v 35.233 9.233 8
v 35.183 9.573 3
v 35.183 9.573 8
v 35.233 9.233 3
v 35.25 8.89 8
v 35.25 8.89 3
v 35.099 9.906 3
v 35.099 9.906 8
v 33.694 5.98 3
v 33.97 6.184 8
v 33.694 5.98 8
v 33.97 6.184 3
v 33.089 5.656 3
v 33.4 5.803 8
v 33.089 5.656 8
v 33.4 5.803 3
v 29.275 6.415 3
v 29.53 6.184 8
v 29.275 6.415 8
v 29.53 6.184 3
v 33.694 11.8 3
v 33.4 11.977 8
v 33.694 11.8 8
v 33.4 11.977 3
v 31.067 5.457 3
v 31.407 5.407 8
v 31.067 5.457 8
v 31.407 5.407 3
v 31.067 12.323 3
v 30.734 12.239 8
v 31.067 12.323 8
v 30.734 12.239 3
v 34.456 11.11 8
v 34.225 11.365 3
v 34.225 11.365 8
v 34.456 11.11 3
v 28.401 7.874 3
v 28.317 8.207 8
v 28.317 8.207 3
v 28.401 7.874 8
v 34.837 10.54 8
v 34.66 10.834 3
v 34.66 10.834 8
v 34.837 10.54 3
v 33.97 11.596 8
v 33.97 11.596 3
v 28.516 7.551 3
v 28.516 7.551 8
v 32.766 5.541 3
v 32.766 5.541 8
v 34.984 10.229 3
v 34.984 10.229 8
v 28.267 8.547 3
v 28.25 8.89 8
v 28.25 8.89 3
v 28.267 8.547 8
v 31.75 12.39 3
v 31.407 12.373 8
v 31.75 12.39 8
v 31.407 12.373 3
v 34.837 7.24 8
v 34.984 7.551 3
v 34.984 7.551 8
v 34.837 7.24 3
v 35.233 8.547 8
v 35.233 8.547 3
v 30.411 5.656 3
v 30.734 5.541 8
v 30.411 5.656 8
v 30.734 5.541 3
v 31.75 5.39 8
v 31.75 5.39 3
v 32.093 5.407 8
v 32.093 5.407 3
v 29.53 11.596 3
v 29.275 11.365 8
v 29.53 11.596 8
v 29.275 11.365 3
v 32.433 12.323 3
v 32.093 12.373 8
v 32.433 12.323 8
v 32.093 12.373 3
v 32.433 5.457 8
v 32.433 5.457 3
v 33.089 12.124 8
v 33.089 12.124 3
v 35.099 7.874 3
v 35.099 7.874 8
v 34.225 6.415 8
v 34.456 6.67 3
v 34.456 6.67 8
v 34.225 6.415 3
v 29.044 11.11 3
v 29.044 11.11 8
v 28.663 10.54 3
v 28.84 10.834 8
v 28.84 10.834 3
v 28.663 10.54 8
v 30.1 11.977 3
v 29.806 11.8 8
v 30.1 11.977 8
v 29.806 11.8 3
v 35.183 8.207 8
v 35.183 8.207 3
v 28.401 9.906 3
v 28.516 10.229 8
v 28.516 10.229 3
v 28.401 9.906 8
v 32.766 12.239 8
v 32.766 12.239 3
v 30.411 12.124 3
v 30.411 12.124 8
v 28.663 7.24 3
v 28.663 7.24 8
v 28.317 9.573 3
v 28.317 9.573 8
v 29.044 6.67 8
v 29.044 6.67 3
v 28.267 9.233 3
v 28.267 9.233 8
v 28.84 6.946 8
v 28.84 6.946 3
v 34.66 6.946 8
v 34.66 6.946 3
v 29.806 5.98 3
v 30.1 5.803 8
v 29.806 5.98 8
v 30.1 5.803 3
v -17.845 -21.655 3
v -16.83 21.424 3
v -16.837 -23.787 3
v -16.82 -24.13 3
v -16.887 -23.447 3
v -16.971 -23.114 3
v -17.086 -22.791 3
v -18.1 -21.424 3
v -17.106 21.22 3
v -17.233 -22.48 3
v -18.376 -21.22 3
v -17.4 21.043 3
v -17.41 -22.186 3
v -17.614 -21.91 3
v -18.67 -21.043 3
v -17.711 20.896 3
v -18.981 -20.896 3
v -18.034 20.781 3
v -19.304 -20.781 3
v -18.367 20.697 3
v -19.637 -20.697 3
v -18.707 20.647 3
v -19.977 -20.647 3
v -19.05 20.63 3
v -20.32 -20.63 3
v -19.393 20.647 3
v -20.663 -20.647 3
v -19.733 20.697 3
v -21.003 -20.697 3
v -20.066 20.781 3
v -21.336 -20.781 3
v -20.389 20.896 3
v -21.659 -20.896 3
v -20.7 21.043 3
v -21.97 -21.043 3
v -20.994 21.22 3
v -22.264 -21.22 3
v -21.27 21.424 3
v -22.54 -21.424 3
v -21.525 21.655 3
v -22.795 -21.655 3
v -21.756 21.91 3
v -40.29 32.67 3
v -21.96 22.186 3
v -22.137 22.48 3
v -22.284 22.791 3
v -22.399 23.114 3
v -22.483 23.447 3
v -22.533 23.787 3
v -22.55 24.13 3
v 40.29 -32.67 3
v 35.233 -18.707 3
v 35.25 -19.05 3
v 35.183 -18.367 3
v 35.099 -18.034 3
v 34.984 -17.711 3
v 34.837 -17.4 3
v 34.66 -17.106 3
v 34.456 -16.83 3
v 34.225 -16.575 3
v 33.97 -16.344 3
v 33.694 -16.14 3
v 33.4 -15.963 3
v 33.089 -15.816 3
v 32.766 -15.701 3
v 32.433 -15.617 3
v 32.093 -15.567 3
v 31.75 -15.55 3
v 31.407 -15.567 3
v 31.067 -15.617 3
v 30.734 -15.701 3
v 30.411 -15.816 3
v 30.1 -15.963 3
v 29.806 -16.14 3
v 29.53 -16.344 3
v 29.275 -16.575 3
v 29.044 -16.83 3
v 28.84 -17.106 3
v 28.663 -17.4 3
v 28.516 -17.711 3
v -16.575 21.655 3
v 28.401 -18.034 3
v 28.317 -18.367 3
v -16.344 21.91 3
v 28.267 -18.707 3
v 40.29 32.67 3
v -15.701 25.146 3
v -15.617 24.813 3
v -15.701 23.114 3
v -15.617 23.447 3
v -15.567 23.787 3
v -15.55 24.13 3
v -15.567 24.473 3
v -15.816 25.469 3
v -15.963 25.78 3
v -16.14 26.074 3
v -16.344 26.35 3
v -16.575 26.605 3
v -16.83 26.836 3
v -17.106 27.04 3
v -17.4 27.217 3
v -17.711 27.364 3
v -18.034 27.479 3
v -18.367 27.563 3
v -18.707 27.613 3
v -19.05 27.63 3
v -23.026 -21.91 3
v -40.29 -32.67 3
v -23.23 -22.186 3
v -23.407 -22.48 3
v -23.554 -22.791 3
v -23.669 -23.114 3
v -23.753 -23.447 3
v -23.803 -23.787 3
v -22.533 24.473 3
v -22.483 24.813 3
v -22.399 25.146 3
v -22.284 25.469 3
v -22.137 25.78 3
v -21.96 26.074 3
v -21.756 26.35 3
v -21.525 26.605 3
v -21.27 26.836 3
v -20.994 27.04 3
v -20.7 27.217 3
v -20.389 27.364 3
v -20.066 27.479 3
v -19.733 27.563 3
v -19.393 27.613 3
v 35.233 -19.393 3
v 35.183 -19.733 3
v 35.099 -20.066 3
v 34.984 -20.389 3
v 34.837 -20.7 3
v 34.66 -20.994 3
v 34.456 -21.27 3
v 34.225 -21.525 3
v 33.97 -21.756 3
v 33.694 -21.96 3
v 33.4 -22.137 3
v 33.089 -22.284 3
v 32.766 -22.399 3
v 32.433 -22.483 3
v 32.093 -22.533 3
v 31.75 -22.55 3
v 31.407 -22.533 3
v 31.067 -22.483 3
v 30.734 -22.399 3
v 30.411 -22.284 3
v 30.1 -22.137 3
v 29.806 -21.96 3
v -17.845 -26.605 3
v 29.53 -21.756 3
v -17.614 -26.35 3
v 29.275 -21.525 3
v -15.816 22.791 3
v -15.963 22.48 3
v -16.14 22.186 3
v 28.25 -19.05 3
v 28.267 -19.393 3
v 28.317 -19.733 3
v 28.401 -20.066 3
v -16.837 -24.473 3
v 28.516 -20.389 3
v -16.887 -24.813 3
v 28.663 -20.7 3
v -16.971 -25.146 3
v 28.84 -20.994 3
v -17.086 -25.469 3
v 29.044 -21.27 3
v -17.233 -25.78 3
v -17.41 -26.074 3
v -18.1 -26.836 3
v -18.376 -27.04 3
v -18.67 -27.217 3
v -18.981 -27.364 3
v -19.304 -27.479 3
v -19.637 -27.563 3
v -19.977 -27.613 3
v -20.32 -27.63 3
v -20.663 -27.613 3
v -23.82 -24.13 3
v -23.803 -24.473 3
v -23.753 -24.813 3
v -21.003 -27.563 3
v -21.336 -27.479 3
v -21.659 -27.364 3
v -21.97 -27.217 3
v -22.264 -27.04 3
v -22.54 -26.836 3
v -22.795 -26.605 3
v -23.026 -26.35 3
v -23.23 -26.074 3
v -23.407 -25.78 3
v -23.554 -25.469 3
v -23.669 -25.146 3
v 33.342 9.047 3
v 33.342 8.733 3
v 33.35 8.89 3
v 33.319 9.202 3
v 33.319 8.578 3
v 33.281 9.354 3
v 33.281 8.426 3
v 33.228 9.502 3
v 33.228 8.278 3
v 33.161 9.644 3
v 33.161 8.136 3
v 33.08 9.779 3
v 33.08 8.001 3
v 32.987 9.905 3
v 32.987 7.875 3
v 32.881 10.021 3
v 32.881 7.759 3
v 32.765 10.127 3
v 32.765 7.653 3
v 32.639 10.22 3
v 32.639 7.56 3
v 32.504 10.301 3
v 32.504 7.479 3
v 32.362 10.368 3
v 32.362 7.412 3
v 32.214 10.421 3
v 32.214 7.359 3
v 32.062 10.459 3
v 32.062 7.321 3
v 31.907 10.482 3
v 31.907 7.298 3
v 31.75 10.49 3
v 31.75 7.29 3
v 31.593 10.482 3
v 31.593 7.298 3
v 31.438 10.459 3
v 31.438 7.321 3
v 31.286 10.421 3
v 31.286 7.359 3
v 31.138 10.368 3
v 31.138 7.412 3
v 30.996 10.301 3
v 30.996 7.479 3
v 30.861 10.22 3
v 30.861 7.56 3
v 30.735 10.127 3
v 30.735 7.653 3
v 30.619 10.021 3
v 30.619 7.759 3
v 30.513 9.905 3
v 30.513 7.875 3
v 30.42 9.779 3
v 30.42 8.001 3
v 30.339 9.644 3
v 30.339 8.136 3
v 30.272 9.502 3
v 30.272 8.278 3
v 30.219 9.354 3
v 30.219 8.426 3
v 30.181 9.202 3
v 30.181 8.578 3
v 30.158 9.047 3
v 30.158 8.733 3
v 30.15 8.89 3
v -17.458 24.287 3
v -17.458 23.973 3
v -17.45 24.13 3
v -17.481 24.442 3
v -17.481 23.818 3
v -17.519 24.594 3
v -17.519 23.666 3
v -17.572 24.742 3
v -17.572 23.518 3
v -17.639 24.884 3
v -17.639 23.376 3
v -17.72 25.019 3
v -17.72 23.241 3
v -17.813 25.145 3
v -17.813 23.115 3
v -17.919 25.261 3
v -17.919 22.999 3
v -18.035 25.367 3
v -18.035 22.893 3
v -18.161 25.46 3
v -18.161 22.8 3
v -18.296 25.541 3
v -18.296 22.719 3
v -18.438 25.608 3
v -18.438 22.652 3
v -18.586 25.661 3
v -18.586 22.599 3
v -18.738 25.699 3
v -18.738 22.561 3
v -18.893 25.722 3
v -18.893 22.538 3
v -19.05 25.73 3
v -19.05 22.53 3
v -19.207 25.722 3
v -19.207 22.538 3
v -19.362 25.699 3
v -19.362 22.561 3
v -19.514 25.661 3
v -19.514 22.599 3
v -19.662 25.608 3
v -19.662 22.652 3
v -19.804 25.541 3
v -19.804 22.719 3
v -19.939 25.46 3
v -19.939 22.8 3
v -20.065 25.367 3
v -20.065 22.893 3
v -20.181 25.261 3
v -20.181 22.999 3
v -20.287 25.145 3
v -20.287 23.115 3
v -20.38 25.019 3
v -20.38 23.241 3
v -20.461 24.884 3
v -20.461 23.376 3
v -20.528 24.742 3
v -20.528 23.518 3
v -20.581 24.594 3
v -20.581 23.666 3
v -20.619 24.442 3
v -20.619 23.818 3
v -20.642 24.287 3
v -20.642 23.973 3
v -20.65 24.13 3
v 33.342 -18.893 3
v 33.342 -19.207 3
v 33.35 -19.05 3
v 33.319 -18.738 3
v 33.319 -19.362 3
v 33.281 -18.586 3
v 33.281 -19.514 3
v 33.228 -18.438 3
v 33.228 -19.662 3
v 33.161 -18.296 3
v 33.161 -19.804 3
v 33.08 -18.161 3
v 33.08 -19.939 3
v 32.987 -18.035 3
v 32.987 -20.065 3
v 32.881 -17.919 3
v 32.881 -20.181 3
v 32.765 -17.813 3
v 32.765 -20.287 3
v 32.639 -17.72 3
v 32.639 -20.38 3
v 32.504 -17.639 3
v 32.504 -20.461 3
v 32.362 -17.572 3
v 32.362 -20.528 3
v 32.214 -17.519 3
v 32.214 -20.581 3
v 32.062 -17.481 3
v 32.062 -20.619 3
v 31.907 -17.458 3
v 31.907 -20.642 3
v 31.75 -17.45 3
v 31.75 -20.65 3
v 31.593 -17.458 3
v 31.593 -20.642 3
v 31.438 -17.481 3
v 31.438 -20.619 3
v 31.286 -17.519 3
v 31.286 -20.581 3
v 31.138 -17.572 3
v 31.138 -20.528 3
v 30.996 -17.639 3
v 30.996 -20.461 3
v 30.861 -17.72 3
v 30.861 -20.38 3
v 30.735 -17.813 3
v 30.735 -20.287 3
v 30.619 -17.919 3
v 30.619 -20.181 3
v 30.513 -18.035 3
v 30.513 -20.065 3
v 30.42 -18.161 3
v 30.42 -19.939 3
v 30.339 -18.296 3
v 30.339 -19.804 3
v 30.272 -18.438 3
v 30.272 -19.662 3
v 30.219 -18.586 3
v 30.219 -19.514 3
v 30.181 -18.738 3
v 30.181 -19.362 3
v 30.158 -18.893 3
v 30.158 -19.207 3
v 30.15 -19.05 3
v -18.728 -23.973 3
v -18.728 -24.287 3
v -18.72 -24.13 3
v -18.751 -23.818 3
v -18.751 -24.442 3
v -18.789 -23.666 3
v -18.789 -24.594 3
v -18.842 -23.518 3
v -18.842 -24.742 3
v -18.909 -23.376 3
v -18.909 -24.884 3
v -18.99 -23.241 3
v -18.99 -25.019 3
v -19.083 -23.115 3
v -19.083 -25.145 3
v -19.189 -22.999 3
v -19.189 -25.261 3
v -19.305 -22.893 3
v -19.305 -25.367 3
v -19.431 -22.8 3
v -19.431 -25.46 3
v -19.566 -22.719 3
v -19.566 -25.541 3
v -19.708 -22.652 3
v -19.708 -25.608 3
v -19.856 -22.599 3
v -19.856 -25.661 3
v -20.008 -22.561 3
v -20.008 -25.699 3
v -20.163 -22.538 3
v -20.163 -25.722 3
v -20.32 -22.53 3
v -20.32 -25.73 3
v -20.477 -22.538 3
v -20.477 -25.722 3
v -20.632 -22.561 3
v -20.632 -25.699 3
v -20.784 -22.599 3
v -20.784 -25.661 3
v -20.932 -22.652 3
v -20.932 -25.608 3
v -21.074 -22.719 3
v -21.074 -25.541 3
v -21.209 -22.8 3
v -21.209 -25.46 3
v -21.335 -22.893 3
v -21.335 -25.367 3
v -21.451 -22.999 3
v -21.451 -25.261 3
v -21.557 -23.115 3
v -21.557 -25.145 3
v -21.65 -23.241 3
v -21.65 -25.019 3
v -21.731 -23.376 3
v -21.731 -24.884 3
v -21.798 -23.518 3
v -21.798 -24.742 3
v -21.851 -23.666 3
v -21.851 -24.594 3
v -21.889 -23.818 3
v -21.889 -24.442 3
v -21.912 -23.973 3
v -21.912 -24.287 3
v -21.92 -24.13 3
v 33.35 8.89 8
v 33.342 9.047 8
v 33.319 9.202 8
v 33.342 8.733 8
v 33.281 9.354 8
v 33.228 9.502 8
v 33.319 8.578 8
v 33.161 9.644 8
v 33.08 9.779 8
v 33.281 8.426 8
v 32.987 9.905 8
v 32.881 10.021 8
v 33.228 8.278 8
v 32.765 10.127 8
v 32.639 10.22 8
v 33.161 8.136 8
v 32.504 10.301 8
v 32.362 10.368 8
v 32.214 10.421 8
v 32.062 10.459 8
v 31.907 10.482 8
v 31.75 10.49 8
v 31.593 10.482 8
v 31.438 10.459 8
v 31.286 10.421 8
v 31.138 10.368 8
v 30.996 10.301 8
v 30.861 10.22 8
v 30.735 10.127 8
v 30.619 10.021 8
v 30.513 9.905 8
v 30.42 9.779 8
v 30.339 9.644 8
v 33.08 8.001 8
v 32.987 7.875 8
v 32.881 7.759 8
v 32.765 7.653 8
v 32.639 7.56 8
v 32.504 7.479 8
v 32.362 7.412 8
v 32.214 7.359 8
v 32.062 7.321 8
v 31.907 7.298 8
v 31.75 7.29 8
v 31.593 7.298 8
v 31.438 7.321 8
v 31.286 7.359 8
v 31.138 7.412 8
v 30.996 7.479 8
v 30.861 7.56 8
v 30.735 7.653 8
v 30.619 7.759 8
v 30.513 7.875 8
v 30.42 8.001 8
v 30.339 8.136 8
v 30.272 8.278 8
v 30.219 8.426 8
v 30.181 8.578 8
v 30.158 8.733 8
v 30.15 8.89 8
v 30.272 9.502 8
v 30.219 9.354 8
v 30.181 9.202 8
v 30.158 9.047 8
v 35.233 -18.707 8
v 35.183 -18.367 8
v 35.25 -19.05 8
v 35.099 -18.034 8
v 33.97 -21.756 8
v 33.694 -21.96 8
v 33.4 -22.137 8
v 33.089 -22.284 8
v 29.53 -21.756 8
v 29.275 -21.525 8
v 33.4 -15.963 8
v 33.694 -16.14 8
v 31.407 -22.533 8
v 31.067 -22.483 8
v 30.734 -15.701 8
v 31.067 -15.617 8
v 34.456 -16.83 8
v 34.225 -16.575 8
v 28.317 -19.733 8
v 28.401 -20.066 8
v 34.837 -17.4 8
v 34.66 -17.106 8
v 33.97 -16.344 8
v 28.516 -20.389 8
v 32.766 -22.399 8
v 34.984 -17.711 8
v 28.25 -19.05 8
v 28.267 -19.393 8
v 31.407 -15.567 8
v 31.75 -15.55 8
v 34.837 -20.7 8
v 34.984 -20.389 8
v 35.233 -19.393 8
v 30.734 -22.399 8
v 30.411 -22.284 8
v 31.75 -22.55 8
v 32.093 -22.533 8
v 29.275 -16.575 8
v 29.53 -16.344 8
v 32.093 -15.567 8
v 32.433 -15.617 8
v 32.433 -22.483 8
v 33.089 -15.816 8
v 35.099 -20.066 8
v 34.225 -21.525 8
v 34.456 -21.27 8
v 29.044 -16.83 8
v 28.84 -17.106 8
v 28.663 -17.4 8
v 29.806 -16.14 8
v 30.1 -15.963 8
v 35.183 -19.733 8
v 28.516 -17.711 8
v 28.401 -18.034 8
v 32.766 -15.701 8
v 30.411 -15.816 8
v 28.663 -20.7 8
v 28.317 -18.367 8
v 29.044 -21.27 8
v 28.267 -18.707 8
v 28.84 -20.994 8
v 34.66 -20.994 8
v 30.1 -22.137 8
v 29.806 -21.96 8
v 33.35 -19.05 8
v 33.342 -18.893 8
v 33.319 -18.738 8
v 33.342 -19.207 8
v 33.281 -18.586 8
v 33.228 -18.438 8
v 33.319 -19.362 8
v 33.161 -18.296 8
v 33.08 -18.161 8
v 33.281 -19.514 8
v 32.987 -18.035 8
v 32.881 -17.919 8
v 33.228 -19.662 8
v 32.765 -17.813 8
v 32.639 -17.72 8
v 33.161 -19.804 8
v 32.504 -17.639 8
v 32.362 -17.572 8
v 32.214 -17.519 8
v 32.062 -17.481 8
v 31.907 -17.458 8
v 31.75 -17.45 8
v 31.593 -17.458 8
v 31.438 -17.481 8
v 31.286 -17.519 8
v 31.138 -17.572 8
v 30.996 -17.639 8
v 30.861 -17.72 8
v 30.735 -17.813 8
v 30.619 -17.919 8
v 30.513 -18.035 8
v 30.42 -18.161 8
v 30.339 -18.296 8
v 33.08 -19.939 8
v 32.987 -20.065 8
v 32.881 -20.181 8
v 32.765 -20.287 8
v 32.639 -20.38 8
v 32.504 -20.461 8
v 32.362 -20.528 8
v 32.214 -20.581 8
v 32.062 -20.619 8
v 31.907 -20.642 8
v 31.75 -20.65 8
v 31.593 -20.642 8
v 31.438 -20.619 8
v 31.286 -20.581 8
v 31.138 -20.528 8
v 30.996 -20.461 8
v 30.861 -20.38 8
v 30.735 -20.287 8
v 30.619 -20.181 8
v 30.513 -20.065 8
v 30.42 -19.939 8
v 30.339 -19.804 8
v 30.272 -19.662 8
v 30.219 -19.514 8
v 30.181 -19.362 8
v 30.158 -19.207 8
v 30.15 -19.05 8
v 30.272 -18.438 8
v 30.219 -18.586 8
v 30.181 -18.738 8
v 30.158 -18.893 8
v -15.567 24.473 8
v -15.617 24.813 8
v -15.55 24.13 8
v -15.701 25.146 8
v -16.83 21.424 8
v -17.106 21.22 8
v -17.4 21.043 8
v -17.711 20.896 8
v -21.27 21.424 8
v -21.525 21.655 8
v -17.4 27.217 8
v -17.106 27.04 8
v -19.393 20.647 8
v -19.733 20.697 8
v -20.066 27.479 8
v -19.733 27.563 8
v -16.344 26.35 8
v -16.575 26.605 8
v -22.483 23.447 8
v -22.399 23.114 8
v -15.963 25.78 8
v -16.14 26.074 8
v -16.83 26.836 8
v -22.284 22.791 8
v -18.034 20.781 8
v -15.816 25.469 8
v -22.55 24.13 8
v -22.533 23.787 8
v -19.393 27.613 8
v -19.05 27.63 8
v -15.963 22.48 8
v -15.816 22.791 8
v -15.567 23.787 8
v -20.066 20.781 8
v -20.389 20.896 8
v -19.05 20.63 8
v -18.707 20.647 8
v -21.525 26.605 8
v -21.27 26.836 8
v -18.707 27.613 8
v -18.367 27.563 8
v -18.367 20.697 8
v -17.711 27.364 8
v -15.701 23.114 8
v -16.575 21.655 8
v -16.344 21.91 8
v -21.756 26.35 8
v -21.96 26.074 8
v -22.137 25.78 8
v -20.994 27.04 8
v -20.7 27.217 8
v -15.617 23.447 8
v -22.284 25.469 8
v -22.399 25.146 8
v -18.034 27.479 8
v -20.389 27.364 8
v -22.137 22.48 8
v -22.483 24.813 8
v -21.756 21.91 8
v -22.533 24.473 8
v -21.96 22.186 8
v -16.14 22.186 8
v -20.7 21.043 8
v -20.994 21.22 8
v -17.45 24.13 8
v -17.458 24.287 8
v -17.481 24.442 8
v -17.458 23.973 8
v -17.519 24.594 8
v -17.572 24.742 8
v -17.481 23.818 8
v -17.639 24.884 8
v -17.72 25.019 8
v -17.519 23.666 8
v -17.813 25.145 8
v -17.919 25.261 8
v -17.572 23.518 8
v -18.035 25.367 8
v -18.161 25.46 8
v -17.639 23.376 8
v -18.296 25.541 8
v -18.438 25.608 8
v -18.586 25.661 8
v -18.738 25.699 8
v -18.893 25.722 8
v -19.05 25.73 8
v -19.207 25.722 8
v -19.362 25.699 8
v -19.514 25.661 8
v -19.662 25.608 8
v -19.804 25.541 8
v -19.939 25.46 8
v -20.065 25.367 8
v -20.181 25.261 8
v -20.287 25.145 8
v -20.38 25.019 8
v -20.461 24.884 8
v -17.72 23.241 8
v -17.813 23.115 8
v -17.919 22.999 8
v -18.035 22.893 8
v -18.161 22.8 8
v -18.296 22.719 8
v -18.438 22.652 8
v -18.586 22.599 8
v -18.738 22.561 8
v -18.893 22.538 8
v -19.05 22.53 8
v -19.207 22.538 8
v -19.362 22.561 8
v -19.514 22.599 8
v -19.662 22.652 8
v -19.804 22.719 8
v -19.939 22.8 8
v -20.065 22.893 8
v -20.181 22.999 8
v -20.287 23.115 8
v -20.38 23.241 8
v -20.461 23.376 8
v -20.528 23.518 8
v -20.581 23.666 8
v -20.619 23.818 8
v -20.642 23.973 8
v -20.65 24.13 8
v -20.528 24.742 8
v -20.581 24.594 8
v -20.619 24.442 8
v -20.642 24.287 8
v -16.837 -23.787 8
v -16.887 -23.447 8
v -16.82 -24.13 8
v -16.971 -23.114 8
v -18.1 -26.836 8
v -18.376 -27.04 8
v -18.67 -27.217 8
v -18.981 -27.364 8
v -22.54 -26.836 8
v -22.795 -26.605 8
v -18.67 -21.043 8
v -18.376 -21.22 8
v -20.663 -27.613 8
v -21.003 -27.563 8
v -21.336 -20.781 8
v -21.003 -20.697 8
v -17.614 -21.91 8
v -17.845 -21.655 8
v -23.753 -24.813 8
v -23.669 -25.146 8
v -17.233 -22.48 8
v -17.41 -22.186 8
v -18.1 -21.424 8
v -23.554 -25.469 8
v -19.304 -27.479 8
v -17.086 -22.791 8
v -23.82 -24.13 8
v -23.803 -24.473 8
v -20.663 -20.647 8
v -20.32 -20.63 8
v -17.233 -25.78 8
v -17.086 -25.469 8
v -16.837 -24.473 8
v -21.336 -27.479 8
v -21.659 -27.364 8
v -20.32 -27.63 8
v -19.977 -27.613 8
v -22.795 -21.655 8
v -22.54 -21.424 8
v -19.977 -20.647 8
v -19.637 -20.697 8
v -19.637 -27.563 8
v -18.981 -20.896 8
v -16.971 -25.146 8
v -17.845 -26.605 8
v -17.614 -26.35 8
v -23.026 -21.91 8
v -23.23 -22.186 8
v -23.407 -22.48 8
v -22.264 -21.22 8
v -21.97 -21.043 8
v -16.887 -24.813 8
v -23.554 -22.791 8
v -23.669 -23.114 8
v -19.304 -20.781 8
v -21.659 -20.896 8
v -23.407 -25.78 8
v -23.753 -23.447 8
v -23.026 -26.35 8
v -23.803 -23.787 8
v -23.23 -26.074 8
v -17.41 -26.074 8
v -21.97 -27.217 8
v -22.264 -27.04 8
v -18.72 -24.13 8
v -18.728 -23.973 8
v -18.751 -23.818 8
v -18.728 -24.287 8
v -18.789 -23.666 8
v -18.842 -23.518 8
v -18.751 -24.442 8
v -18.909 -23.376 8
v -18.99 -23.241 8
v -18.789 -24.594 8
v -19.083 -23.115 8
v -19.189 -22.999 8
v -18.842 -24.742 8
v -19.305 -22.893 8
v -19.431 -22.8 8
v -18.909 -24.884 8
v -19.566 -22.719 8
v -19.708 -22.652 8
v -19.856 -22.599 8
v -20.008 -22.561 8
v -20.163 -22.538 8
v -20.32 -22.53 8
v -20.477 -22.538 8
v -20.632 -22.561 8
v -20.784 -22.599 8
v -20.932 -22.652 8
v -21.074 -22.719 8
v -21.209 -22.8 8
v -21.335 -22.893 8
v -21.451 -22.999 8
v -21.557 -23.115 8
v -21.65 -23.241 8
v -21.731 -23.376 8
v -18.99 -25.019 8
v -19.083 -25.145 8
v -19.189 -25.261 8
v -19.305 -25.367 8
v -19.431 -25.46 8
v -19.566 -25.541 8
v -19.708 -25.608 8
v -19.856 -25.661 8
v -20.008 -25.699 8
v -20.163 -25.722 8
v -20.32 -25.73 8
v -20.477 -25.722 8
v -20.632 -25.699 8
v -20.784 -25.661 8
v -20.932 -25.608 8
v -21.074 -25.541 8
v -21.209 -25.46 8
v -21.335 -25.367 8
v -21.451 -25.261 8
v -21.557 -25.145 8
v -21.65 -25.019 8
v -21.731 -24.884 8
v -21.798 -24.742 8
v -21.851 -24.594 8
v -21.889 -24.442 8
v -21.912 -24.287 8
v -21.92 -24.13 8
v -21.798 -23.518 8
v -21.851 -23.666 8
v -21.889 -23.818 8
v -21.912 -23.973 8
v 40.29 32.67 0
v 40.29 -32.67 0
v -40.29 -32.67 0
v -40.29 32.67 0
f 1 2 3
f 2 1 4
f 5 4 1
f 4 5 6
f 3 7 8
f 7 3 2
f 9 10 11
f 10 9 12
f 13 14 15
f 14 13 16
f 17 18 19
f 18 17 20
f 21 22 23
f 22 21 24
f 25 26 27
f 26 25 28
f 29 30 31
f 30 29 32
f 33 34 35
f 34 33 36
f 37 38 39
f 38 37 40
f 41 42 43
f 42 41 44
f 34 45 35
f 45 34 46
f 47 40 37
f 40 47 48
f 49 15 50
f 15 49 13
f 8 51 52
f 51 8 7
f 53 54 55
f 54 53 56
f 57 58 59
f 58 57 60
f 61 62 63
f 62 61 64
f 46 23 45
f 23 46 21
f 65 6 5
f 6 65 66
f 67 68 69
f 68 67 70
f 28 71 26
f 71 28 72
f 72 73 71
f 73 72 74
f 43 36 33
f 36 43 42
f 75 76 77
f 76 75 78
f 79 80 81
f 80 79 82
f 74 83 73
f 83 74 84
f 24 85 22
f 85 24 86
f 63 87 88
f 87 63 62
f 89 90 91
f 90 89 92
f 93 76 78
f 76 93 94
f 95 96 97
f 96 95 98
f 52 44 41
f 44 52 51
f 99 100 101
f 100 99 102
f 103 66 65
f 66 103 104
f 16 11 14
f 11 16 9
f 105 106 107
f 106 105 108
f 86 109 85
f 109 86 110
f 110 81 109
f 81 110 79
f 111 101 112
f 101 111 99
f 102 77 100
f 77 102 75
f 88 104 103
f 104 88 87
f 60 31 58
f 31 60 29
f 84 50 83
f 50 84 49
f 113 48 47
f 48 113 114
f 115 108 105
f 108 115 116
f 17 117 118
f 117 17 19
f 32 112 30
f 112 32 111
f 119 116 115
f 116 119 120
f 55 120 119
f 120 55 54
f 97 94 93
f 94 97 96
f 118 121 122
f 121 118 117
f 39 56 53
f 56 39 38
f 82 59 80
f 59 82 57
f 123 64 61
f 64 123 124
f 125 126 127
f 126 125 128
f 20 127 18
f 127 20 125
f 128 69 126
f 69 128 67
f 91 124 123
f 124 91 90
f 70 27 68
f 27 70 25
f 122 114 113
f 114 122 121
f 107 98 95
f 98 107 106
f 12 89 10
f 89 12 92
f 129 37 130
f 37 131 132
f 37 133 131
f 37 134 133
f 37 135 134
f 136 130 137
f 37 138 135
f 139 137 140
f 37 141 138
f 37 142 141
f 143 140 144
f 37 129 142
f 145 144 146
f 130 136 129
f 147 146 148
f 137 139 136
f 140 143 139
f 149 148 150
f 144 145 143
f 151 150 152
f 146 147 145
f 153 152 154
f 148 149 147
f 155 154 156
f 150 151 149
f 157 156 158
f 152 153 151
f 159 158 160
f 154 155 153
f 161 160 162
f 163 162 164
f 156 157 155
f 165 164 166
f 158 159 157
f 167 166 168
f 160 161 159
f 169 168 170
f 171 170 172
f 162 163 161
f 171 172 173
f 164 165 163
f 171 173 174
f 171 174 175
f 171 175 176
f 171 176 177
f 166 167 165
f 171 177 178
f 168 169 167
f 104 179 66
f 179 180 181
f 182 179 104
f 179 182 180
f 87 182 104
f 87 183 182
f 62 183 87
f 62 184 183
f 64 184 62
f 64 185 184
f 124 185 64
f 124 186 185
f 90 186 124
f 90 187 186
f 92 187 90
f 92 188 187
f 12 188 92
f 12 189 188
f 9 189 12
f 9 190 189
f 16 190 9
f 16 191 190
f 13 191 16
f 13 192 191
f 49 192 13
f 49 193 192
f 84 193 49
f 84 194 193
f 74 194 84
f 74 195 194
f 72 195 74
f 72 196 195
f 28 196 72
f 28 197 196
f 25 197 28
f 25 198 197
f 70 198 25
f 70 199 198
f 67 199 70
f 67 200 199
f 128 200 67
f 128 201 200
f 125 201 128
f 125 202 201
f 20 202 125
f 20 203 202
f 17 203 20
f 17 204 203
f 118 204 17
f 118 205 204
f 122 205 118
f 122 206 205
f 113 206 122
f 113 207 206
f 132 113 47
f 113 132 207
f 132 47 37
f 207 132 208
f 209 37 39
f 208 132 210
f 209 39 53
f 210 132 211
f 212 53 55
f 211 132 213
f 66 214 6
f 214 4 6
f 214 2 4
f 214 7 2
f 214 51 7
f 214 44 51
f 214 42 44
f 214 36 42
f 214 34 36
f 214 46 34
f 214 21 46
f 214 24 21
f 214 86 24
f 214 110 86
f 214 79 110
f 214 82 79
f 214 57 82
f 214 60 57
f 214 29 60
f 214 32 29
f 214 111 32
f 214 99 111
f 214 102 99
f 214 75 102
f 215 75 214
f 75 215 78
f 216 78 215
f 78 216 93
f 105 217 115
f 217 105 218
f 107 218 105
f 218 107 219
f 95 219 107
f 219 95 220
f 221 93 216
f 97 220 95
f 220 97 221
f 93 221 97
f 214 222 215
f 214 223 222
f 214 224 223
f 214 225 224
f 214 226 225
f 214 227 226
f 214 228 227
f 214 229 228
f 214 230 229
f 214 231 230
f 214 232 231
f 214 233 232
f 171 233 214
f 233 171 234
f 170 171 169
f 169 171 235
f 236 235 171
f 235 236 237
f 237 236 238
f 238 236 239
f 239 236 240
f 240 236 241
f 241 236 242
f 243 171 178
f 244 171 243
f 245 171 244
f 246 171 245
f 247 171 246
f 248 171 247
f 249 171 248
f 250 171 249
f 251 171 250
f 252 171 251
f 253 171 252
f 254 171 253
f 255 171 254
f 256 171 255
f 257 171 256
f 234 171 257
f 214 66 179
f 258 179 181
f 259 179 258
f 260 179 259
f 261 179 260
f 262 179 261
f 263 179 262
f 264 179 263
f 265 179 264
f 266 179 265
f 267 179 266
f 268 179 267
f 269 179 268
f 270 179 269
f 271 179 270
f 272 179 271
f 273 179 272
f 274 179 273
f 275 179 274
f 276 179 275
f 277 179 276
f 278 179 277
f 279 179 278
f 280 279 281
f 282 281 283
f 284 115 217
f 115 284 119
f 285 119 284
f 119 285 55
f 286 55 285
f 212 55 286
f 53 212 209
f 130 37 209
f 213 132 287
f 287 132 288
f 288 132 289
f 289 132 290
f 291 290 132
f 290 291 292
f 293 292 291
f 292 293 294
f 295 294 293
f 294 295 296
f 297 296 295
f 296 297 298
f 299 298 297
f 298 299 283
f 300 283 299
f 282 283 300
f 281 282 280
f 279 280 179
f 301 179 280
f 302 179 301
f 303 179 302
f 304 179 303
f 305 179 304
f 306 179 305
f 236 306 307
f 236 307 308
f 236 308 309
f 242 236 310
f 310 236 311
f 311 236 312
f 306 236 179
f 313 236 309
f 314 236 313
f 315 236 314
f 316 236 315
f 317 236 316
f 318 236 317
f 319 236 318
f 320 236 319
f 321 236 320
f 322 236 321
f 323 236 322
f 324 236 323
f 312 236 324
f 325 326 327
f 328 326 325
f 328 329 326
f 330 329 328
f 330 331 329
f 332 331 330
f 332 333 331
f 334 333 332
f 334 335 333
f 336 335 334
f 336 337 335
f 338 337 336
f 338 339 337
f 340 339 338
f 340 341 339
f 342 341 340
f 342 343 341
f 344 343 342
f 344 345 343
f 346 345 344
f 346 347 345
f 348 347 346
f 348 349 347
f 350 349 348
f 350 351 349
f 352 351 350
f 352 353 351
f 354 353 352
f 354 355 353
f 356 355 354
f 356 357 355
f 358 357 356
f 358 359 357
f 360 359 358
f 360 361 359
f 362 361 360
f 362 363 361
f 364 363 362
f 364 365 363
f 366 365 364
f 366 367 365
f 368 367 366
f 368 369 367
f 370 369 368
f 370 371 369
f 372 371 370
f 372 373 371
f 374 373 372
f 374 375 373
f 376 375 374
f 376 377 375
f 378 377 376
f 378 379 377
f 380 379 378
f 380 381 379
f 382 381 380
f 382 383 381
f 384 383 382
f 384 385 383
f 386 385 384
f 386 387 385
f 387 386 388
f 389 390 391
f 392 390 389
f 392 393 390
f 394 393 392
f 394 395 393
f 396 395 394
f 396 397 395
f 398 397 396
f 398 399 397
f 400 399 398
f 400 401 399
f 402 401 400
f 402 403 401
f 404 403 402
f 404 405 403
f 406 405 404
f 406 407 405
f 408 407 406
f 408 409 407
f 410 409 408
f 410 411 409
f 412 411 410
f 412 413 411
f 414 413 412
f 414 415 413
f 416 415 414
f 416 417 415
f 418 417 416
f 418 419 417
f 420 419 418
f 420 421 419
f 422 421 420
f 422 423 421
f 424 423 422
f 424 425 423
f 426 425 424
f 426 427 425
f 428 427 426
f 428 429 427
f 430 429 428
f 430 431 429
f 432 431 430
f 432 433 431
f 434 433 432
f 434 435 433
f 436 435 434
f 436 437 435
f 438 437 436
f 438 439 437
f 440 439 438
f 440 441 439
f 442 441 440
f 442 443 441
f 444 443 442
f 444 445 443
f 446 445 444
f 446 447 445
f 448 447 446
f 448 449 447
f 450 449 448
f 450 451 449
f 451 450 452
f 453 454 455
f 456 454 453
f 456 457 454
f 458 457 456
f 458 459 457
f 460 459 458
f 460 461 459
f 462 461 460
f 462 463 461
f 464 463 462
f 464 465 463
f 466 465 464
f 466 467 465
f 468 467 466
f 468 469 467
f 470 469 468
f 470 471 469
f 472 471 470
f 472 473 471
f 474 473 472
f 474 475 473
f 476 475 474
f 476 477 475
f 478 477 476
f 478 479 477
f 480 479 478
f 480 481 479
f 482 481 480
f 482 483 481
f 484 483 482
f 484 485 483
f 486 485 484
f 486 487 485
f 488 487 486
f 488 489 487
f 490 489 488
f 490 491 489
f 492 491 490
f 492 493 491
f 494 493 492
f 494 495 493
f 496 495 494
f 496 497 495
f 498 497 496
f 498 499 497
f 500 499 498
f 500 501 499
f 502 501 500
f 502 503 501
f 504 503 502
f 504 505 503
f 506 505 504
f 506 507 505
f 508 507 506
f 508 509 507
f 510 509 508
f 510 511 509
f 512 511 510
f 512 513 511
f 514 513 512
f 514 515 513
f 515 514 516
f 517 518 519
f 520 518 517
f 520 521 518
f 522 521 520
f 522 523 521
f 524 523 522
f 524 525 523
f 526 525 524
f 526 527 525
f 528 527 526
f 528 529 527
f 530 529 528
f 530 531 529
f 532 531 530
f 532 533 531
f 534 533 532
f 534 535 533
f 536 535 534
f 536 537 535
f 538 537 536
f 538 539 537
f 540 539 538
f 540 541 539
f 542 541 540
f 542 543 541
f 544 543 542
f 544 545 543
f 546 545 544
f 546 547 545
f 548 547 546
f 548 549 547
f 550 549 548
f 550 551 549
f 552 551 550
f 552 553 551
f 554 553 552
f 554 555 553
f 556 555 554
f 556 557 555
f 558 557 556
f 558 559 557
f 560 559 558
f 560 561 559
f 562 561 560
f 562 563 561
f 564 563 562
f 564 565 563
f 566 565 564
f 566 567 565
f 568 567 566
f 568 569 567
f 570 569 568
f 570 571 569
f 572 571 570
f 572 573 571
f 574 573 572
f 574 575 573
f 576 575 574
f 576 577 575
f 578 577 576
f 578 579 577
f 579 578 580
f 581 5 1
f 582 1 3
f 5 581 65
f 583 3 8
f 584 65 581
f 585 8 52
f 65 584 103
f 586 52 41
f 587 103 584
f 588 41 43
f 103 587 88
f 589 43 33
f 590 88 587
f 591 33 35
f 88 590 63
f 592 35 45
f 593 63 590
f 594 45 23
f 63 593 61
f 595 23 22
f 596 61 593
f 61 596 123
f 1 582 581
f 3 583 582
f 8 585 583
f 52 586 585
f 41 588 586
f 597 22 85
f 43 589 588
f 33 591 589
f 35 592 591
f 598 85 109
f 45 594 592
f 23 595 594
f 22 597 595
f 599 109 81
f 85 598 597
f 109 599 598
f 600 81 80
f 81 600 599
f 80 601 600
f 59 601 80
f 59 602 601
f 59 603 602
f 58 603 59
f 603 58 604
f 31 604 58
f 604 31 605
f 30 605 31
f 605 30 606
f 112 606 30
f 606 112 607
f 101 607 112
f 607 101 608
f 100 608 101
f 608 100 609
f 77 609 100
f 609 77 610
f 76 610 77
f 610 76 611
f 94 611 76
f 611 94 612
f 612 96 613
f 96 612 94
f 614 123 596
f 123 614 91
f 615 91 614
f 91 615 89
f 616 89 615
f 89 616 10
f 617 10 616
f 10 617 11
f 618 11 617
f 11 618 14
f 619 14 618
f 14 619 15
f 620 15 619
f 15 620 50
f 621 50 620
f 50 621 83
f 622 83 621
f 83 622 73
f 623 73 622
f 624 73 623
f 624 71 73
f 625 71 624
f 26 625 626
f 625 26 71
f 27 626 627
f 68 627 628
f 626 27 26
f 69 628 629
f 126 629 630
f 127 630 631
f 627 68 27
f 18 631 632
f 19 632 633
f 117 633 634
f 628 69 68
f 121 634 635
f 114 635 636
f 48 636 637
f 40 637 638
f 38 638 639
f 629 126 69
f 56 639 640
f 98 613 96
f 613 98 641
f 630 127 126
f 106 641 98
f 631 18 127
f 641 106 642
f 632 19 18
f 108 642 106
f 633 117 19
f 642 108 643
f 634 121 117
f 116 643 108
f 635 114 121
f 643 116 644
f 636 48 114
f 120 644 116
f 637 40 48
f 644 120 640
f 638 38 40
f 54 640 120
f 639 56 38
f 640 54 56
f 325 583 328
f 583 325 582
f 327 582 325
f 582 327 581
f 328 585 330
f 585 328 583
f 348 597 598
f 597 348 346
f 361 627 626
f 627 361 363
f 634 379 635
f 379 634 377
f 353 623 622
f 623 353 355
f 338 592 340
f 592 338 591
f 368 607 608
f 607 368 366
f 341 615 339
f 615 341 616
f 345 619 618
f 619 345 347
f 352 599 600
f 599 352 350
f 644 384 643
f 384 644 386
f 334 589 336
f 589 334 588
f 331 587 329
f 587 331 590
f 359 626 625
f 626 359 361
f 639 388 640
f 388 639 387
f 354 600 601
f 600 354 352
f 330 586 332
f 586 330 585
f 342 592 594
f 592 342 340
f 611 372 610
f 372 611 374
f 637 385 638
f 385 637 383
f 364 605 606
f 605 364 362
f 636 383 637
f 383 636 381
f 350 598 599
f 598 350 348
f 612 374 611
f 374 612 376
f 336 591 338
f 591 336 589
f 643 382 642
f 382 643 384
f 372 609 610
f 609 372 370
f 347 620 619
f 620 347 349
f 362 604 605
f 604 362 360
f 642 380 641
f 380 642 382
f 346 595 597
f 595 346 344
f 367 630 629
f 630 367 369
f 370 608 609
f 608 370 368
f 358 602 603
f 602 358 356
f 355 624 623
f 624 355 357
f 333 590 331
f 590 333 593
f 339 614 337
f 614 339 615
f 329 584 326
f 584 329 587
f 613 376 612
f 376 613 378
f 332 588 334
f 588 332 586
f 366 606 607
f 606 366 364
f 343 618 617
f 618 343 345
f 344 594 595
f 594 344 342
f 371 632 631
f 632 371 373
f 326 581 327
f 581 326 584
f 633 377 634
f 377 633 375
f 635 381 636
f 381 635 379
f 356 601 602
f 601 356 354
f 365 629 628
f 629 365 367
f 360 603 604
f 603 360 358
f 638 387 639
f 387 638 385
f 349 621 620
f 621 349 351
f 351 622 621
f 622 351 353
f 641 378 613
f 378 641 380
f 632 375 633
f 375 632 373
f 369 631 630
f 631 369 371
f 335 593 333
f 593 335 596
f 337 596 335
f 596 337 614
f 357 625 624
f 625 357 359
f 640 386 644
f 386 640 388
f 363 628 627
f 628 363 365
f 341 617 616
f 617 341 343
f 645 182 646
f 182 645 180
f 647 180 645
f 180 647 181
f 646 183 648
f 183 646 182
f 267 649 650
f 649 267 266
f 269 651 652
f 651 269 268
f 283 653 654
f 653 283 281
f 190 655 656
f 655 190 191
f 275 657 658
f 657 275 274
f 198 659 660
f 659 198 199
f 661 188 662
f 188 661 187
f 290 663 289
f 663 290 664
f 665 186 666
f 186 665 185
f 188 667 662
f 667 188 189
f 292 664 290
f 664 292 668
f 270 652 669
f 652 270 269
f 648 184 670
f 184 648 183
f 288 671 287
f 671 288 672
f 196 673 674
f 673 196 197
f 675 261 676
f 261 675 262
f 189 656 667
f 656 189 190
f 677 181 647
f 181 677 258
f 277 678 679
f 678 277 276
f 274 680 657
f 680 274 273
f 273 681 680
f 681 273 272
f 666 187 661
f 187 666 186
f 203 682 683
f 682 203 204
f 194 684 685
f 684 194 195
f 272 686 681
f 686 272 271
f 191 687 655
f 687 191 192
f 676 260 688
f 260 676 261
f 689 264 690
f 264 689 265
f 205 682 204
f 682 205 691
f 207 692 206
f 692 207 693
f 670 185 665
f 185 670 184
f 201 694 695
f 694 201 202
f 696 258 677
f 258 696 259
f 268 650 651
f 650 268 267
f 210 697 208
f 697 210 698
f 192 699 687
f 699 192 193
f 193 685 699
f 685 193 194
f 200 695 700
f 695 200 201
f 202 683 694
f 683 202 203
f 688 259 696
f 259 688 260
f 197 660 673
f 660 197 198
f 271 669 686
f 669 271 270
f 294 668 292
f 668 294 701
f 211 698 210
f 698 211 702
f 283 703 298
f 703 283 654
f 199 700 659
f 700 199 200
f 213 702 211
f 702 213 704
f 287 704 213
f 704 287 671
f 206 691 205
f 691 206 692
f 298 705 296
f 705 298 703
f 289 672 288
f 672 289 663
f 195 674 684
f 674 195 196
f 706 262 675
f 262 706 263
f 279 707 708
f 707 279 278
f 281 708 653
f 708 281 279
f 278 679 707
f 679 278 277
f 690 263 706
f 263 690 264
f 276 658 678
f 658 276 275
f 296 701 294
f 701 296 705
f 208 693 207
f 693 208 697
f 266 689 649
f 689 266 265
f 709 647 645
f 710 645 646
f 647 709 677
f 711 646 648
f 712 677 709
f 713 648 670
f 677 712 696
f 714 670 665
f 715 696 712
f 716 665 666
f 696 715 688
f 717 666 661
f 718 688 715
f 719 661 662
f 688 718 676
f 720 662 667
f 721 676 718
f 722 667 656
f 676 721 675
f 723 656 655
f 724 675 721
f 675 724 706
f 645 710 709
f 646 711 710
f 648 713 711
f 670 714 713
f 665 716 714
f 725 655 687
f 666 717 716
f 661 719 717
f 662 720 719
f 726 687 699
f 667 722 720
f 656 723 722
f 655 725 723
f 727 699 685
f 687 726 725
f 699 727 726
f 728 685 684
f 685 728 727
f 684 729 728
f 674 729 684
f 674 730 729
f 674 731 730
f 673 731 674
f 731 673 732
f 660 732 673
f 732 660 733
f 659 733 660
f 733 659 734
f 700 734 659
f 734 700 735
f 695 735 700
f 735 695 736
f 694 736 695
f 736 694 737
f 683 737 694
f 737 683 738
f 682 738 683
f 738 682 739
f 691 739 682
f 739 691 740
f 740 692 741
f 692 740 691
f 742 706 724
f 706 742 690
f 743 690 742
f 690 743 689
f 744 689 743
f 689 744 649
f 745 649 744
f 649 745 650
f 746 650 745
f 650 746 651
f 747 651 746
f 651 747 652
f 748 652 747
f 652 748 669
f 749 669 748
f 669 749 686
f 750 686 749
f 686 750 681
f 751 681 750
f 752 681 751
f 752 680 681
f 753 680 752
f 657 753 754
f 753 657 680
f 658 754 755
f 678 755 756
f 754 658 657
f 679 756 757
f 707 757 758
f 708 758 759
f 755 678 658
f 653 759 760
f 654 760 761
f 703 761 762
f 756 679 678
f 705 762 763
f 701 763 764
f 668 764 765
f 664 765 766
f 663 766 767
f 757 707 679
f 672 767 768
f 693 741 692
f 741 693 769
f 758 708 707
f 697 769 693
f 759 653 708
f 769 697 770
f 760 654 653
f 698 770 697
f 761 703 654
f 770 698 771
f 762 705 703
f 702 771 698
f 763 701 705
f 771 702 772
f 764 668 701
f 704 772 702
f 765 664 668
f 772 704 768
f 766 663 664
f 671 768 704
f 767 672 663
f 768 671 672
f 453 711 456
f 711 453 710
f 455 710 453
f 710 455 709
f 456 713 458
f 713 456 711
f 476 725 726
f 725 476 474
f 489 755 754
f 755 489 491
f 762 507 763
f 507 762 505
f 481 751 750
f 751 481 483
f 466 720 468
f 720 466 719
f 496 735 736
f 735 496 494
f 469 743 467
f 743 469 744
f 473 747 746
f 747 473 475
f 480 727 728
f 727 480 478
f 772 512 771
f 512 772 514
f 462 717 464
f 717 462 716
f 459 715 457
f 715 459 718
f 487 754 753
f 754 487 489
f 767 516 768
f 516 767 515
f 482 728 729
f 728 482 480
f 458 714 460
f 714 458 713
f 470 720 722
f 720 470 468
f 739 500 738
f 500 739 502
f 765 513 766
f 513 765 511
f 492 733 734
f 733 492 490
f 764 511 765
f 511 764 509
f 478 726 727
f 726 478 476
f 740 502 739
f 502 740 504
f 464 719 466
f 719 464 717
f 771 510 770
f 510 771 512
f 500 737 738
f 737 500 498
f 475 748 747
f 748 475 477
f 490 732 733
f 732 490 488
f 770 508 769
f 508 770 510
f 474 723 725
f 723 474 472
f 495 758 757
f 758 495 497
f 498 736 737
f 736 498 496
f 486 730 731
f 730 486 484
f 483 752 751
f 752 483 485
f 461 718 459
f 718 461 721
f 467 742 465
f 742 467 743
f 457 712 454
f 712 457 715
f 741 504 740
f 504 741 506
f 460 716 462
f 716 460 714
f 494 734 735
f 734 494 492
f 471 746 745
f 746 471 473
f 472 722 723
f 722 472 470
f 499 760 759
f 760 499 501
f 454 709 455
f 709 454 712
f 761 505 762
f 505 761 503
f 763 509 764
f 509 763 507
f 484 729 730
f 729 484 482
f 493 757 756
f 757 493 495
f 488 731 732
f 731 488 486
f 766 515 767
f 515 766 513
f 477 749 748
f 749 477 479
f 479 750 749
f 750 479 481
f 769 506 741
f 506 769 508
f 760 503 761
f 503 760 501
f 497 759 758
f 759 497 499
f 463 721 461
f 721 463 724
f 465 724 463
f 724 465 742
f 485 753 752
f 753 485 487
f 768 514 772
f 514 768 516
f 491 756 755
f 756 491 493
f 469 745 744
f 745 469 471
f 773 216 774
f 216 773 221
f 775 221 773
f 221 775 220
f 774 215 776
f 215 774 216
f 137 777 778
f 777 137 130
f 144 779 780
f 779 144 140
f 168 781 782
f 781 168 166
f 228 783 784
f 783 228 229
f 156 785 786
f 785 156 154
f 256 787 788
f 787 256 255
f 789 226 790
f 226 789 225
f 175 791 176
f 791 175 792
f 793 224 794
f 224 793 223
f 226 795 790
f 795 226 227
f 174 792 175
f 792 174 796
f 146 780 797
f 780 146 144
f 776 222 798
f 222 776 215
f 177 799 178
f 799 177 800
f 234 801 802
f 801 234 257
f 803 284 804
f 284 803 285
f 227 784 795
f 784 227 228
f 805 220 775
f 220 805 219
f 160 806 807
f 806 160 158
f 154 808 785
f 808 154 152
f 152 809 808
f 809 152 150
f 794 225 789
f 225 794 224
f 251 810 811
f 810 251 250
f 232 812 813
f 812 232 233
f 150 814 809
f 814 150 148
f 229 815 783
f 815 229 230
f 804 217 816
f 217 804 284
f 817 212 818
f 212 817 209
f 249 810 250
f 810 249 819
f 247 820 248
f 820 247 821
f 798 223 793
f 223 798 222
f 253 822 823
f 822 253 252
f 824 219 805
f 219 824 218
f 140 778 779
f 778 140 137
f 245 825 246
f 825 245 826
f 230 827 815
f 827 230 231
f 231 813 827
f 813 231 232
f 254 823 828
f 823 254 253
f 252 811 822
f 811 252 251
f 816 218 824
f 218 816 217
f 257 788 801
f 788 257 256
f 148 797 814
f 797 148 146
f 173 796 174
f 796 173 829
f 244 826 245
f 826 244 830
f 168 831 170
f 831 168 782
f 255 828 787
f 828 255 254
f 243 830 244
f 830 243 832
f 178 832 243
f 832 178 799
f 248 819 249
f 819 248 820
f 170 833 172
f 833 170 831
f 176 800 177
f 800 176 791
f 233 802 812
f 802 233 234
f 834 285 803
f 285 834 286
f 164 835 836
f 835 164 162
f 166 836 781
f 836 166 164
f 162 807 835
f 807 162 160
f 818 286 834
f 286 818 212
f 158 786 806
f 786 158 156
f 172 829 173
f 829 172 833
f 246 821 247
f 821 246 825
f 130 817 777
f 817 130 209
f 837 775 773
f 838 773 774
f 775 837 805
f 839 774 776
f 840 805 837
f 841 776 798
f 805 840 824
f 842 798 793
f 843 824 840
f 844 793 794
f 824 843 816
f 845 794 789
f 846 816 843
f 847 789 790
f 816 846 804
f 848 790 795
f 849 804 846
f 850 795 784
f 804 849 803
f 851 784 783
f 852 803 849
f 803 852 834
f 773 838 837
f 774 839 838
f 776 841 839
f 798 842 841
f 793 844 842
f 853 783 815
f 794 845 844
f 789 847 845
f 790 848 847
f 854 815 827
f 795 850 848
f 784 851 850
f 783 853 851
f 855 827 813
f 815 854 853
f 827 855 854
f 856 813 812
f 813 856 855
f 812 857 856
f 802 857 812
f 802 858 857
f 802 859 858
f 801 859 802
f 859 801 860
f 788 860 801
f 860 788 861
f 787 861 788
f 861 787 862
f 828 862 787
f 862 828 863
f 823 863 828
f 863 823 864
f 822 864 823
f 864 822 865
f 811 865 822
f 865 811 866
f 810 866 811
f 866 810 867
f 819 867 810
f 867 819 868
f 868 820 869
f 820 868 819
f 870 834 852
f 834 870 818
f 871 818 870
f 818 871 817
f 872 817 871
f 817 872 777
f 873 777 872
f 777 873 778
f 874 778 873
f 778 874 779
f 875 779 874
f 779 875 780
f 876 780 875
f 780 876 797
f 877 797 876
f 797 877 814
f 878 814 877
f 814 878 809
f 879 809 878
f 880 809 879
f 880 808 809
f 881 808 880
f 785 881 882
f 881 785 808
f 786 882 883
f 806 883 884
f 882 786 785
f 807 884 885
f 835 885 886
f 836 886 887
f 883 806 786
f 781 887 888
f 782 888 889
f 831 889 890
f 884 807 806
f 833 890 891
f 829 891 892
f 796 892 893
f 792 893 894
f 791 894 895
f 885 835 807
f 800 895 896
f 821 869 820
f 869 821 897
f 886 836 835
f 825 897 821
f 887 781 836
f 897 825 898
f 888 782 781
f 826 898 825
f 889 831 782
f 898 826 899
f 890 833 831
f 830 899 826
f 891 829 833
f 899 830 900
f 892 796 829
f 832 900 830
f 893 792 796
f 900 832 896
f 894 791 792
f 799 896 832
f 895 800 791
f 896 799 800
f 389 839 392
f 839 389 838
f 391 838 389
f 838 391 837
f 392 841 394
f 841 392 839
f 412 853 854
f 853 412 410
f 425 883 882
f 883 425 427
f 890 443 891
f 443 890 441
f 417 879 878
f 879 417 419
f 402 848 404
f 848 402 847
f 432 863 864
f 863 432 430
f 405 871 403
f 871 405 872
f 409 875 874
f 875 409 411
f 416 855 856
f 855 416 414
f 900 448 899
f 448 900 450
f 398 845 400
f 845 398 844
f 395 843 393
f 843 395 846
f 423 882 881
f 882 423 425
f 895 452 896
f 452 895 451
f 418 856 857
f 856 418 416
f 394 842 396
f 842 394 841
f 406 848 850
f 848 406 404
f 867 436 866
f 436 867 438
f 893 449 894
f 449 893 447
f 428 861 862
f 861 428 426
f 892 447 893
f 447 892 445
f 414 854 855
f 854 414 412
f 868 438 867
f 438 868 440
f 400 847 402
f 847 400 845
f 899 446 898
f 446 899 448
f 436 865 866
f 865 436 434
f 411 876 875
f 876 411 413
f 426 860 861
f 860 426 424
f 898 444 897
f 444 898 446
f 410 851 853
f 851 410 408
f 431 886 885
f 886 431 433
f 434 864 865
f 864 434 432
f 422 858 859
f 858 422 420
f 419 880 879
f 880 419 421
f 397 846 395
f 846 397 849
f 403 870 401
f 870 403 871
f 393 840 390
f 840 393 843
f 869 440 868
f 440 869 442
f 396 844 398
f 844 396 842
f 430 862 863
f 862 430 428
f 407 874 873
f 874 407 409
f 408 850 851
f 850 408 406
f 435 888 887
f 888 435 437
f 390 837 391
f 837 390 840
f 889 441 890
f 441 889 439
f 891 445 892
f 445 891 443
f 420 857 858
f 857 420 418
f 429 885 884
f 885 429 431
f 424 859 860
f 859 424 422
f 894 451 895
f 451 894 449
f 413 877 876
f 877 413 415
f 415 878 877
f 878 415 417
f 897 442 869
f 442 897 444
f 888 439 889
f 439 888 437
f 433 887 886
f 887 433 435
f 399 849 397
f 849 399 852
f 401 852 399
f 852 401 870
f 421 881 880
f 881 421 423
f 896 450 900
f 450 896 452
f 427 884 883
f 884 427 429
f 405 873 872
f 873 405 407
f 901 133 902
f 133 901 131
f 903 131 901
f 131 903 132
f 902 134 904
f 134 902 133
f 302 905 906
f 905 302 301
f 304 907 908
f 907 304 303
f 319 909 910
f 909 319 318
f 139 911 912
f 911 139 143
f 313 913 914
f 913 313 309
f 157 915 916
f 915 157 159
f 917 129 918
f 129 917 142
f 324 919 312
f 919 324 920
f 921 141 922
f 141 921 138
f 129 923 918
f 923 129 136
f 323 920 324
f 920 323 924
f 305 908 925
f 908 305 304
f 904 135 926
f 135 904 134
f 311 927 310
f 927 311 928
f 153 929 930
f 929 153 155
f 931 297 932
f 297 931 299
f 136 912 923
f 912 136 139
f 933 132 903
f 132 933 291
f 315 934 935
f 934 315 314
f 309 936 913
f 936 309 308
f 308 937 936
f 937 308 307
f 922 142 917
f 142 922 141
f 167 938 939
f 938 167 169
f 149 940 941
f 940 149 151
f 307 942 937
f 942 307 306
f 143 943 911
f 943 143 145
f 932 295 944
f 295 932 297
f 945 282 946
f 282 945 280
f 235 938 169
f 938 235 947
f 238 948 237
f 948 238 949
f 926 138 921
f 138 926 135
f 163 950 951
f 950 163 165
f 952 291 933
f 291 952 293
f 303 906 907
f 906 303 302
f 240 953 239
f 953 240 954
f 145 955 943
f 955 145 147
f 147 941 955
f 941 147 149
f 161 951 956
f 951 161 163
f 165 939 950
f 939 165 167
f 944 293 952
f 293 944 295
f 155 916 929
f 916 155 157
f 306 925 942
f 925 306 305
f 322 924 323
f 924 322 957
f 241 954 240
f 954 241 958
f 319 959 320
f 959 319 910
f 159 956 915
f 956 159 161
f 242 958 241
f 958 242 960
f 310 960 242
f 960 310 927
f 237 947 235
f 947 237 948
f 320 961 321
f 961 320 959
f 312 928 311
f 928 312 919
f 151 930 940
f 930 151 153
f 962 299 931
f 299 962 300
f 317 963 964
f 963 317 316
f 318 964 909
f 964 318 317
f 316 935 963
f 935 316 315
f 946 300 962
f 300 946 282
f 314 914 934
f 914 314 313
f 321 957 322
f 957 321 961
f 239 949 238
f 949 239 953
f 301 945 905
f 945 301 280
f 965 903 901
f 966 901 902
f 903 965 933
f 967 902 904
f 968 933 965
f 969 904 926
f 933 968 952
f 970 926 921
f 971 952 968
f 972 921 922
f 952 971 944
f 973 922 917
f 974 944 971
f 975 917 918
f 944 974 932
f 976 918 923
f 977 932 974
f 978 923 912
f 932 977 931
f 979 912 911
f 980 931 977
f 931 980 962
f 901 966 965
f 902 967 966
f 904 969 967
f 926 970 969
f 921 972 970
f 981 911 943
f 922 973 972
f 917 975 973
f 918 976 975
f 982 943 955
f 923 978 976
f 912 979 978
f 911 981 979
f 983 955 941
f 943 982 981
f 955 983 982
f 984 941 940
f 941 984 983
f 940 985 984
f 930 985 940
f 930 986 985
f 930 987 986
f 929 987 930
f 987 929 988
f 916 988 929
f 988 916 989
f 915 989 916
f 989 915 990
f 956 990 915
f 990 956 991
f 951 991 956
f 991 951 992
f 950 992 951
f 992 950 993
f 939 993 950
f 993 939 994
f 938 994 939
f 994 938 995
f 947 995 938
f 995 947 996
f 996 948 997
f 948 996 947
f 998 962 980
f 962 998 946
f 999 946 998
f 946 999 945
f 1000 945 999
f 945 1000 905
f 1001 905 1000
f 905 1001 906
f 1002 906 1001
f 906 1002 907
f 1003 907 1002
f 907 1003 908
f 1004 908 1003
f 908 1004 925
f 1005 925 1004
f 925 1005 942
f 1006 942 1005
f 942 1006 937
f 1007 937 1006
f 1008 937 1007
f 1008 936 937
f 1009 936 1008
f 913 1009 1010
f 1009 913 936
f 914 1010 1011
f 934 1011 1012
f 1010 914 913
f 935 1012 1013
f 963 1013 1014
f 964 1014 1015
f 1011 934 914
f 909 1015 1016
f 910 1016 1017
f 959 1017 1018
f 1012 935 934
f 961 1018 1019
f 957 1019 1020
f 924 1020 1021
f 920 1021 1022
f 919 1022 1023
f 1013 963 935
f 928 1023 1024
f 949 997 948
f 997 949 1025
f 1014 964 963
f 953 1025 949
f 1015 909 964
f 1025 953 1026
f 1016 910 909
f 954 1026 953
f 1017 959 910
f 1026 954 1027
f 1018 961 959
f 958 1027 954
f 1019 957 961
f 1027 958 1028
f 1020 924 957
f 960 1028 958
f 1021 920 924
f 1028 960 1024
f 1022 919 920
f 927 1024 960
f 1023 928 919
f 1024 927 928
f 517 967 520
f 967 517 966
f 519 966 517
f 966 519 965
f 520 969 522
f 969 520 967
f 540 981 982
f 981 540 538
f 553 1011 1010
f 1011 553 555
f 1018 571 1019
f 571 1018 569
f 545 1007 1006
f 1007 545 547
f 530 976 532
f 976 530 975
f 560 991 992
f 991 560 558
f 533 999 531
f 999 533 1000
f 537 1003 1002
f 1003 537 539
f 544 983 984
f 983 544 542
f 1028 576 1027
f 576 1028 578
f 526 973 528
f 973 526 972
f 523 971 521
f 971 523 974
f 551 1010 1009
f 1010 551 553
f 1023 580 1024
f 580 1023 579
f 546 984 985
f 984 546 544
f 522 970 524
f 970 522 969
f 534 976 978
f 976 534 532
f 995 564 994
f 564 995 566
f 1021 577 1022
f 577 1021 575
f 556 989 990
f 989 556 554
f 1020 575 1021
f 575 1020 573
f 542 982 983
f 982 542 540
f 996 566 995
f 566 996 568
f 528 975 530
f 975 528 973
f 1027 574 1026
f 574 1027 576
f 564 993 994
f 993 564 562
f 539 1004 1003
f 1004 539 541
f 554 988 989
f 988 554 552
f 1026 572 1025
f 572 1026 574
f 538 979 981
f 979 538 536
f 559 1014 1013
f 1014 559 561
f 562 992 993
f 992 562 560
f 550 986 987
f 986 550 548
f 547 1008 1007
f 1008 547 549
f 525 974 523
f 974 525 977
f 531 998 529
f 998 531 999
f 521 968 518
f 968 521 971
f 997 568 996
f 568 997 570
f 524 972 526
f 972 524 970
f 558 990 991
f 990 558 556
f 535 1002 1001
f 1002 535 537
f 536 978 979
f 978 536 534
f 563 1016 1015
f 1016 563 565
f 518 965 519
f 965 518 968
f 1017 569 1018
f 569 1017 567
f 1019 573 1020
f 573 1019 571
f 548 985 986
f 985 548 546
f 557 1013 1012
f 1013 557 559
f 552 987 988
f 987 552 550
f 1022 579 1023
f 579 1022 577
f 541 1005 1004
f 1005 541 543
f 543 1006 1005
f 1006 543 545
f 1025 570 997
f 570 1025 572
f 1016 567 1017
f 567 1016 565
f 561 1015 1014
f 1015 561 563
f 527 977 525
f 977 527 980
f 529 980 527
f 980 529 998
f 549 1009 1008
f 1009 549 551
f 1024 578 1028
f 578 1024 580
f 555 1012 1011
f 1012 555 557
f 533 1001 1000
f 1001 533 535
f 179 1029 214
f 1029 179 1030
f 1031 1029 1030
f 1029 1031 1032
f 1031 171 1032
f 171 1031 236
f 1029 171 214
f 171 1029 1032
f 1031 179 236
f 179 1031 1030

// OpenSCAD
// ChatMaker ChatCAD Alpha - uno-mounting-plate
$fn = 64;
plate_width = 80.580000;
plate_depth = 65.340000;
plate_thickness = 3.000000;
standoff_height = 5.000000;
standoff_outer_diameter = 7.000000;
hole_diameter = 3.200000;
mounting_holes = [
  [31.750000, 8.890000],
  [31.750000, -19.050000],
  [-19.050000, 24.130000],
  [-20.320000, -24.130000]
];

module mounting_plate() {
  union() {
    translate([-plate_width / 2, -plate_depth / 2, 0])
      cube([plate_width, plate_depth, plate_thickness]);
    for (point = mounting_holes)
      translate([point[0], point[1], plate_thickness])
        difference() {
          cylinder(h=standoff_height, d=standoff_outer_diameter);
          translate([0, 0, -0.01]) cylinder(h=standoff_height + 0.02, d=hole_diameter);
        }
  }
}

mounting_plate();
